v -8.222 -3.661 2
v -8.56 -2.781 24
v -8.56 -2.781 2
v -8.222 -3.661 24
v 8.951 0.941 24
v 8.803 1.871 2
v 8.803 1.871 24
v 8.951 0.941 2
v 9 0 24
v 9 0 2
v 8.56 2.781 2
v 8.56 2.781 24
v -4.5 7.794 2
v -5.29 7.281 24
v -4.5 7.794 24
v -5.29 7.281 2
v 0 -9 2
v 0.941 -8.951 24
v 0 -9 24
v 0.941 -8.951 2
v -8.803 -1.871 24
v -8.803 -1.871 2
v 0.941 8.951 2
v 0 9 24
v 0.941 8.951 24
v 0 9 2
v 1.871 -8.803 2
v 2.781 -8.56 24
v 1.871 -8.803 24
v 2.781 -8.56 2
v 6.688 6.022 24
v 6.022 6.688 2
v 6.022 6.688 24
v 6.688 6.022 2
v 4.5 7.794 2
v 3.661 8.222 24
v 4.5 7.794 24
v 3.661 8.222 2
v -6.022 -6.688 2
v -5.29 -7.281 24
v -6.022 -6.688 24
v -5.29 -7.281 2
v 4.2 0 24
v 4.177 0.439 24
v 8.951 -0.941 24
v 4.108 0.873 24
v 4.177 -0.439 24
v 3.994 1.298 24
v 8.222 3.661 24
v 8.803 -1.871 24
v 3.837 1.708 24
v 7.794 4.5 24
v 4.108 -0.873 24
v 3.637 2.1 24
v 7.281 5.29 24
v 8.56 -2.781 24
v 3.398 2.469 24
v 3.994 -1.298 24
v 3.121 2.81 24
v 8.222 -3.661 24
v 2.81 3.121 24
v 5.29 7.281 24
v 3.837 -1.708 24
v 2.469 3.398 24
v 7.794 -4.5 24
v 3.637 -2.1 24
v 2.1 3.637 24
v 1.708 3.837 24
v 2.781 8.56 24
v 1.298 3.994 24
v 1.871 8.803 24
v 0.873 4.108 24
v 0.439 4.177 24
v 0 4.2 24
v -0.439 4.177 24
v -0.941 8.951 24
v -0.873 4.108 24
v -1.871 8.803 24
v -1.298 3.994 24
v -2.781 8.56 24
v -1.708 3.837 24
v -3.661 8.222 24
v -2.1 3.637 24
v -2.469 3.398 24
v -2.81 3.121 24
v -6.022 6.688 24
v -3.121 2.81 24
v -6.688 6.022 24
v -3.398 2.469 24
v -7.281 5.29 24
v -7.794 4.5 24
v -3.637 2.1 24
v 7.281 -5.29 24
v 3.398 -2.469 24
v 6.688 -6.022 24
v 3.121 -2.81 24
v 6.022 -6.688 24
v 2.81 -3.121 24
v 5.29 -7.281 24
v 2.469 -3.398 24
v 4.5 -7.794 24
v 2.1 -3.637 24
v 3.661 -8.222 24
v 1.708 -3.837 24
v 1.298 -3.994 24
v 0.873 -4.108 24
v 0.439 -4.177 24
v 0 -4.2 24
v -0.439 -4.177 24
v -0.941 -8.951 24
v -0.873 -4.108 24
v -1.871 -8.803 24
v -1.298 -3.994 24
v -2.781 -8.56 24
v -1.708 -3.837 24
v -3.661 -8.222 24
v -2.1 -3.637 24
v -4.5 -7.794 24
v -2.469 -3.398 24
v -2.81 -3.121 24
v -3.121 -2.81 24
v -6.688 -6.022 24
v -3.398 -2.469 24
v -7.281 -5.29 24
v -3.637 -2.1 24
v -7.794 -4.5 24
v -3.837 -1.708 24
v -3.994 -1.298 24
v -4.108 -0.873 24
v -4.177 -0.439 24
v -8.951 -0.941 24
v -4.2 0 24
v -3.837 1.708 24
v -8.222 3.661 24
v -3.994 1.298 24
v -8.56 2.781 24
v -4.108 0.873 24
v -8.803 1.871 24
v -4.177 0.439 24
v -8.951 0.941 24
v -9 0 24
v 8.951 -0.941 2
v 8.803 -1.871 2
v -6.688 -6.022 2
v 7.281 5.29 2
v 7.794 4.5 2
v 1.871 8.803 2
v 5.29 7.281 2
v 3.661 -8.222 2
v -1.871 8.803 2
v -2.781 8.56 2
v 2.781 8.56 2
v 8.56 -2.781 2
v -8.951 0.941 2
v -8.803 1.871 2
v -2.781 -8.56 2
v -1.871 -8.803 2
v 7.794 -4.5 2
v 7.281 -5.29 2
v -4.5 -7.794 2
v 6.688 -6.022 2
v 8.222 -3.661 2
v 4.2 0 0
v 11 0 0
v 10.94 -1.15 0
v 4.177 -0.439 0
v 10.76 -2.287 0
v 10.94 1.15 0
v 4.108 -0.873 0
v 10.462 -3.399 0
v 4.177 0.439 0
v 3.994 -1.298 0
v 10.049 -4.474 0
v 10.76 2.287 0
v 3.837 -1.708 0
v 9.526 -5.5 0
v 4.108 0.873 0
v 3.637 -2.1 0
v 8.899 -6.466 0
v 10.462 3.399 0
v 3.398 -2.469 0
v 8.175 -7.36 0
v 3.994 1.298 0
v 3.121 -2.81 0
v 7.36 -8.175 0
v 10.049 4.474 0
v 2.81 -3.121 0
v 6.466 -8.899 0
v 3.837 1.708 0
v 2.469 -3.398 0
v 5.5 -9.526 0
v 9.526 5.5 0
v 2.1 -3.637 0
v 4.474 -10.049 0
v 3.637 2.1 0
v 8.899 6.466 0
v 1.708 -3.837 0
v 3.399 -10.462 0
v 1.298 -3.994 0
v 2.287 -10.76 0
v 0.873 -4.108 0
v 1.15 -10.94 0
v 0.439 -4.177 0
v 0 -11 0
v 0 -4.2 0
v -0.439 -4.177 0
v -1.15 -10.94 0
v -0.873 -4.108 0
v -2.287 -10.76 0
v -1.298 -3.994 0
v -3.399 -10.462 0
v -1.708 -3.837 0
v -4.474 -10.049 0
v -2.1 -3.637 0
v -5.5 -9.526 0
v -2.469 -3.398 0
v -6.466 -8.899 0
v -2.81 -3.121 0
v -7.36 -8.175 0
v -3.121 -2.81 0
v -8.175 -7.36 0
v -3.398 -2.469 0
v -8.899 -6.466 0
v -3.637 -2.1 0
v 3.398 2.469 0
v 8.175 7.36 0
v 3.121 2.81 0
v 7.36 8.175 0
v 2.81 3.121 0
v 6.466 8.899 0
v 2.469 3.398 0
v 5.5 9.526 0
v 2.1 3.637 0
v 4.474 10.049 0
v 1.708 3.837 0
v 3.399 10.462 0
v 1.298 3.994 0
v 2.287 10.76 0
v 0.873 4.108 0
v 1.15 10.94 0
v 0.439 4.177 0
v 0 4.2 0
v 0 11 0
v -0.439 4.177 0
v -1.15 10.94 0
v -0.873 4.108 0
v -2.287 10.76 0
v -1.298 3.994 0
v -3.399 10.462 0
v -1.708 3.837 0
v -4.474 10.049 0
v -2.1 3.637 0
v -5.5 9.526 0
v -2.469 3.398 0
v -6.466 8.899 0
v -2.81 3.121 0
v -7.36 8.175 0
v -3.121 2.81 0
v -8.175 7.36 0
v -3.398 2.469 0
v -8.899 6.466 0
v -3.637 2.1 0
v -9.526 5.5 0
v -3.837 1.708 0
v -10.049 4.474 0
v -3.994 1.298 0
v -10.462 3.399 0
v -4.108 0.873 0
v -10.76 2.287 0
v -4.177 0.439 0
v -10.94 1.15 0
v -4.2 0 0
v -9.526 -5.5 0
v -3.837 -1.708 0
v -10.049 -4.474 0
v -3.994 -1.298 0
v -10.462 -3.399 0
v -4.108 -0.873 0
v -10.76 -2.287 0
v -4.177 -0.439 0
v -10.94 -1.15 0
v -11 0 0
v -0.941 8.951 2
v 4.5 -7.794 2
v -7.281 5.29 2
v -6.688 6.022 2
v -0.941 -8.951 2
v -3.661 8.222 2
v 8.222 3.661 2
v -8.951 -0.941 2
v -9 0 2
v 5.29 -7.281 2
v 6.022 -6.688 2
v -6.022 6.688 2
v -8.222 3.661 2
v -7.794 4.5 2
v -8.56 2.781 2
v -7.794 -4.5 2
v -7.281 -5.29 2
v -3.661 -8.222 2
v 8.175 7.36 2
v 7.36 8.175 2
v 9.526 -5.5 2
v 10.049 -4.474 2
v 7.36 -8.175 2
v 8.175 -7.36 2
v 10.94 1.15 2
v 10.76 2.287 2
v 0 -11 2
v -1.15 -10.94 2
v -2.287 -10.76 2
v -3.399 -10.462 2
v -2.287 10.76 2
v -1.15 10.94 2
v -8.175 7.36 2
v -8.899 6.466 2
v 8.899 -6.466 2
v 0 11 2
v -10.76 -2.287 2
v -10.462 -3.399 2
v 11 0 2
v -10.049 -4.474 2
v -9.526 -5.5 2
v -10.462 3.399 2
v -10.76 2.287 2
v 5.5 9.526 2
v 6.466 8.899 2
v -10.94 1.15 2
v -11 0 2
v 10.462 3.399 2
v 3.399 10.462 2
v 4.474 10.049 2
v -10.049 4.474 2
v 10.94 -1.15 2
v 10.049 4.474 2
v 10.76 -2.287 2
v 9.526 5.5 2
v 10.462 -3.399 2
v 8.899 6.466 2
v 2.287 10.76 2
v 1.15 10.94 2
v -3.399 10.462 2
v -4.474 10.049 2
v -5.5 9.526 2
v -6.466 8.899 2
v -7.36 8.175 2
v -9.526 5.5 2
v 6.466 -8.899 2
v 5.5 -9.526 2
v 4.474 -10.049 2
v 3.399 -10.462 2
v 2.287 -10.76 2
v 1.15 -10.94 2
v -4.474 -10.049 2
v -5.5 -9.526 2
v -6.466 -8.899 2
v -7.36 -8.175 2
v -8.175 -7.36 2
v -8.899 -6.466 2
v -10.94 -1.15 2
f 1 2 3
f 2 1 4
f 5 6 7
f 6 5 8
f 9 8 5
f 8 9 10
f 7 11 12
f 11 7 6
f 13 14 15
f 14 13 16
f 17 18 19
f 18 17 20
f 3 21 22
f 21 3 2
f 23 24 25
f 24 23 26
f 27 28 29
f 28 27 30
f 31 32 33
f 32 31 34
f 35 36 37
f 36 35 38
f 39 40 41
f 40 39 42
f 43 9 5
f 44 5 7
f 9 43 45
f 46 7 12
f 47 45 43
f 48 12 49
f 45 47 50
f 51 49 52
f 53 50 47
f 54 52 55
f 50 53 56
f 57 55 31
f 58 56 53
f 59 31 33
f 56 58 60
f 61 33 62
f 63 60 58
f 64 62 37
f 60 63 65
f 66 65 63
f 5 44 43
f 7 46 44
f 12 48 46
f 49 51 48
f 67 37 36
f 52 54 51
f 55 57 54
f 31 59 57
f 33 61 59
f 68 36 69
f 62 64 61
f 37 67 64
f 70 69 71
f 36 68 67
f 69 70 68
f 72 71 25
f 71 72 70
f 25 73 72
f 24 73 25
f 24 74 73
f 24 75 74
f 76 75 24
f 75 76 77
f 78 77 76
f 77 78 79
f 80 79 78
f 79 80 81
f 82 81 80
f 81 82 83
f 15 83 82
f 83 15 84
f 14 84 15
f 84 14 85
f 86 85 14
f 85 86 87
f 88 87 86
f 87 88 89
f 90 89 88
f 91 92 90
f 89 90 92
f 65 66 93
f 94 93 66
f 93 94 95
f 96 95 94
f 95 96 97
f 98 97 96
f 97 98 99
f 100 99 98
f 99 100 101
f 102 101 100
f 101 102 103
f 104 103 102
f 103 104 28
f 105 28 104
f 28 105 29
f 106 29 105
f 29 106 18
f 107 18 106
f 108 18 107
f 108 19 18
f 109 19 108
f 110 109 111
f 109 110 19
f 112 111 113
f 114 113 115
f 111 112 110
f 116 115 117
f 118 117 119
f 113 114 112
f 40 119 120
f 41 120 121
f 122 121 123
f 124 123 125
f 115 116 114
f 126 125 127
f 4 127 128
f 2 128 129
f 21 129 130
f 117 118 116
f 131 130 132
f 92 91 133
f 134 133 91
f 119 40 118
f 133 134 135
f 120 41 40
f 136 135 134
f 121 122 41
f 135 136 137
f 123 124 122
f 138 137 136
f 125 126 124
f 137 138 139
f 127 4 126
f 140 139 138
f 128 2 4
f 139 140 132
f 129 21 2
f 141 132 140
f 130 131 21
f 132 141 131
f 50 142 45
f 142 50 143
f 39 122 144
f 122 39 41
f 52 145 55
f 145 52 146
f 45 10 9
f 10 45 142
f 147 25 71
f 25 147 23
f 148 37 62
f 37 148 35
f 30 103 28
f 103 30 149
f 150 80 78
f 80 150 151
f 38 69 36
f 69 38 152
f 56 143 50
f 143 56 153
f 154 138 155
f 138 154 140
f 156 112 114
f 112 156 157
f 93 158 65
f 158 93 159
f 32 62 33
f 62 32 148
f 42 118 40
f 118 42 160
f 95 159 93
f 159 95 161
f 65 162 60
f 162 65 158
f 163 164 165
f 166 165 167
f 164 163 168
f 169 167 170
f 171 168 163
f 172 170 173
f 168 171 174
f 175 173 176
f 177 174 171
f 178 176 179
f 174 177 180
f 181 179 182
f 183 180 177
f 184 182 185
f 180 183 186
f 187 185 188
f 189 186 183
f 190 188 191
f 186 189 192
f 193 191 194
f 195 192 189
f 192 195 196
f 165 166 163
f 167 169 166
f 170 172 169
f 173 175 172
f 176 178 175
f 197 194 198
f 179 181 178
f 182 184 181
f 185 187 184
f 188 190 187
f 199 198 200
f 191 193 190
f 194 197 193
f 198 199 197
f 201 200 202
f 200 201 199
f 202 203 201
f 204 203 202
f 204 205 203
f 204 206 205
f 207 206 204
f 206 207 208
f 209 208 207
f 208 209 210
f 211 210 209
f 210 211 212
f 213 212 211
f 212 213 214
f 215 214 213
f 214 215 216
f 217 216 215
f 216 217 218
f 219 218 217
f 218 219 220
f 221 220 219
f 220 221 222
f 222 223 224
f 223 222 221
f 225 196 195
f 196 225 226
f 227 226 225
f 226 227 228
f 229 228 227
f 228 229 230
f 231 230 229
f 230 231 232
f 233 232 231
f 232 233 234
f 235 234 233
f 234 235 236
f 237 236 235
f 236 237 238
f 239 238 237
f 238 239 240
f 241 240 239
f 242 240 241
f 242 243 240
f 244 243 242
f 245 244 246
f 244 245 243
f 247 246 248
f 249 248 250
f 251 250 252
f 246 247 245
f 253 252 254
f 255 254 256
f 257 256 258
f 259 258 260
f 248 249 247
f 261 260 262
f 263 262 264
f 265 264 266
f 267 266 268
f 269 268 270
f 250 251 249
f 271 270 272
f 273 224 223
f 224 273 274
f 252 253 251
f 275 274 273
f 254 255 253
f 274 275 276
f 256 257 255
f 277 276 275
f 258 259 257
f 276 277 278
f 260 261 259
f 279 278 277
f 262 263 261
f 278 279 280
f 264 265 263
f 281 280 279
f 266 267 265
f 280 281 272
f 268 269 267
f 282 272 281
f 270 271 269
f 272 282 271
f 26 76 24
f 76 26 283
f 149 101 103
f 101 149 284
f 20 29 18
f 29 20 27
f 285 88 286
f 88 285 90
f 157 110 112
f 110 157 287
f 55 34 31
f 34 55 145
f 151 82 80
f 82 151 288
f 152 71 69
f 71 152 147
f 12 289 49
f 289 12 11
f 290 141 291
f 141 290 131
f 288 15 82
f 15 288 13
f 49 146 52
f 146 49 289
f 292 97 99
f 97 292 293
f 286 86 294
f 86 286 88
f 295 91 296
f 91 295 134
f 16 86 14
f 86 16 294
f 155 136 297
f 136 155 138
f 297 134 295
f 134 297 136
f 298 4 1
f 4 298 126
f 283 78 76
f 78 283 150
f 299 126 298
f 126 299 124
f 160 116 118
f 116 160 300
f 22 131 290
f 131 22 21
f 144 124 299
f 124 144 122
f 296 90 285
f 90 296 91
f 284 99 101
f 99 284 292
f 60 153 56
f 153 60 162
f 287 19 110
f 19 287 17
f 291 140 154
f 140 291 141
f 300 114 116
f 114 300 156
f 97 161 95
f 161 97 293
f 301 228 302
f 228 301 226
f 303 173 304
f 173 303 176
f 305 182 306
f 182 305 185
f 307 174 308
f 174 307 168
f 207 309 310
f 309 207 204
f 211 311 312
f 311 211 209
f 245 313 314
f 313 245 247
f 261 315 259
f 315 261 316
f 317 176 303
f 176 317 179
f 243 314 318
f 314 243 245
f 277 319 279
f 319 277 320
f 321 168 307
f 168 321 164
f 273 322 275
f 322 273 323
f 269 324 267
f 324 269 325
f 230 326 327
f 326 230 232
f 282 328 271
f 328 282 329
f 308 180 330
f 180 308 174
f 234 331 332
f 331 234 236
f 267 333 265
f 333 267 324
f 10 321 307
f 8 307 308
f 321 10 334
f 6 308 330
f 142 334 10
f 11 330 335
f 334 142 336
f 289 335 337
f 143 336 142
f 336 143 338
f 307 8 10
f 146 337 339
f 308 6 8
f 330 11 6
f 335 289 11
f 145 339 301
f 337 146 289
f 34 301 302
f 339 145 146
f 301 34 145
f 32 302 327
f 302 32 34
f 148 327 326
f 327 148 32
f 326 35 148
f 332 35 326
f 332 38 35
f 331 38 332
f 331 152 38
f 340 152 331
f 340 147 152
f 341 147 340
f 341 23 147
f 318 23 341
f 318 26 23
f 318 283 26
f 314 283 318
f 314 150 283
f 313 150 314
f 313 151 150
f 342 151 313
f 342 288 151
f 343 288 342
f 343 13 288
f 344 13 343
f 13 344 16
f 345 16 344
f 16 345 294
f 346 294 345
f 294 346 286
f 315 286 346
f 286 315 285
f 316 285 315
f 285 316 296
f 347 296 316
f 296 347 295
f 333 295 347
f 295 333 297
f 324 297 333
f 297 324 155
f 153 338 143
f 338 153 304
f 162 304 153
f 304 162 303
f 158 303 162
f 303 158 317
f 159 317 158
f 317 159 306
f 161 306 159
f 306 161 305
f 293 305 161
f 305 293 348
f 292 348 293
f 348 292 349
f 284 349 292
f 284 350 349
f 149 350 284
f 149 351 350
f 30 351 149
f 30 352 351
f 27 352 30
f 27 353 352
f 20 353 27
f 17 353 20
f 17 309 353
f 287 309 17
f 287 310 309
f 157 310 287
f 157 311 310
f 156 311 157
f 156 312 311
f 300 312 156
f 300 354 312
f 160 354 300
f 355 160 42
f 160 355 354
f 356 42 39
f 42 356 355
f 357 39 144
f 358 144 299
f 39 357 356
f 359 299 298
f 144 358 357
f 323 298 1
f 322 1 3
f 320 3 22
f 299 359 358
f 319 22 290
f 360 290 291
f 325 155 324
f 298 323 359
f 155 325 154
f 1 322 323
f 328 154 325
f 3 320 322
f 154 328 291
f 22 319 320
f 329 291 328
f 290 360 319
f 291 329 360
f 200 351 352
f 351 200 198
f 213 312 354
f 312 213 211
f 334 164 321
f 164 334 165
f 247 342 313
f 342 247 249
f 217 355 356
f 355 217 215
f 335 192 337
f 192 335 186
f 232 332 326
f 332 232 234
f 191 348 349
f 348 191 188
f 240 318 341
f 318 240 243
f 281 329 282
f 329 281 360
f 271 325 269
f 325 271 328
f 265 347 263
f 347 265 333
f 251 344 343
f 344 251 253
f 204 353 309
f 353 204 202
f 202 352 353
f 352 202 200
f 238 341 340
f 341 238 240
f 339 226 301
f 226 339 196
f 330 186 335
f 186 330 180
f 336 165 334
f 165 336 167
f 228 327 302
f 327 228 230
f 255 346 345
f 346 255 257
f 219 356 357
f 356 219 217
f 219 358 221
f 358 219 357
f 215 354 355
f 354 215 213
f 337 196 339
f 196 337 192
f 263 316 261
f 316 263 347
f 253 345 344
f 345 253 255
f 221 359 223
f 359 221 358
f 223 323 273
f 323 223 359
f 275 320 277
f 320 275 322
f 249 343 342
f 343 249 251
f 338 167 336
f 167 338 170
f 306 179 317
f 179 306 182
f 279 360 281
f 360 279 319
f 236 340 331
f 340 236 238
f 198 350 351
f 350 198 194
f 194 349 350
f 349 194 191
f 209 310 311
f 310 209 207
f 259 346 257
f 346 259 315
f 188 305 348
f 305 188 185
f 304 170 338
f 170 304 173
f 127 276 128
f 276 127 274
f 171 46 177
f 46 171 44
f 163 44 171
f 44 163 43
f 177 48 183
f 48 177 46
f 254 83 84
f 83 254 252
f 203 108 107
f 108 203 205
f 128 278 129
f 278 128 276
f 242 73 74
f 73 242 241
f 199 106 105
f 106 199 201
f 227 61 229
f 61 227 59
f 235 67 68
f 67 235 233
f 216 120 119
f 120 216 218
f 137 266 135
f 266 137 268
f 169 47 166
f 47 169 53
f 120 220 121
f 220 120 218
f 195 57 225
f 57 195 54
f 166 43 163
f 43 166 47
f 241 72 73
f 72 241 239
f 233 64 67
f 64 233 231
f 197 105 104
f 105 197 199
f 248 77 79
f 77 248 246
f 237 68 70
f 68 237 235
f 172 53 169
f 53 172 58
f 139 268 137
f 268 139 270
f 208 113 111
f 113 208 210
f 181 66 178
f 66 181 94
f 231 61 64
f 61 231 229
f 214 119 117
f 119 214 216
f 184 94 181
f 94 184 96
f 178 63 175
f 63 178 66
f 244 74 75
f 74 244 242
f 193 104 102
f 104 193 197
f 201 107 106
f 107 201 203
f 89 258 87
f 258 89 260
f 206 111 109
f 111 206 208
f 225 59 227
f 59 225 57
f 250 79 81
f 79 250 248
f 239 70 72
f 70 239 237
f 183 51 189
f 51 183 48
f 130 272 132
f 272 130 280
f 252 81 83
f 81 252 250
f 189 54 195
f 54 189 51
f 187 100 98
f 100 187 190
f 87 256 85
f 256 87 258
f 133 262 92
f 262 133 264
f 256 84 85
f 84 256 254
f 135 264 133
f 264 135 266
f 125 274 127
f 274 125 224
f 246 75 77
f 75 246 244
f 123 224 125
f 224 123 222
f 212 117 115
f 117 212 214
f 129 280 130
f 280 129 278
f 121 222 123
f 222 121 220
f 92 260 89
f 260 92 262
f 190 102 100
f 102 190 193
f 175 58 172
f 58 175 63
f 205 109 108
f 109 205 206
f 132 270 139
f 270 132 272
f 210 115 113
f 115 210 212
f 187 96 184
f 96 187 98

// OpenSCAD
// Motor mounting standoff.
$fn = 60;
eps = 0.02;
thread_d = 8.4;
outer_d = 18;
length = 24;
difference() {
    union() { cylinder(d=outer_d,h=length); cylinder(d=outer_d+4,h=2); }
    translate([0,0,-eps]) cylinder(d=thread_d,h=length+2*eps);
}
